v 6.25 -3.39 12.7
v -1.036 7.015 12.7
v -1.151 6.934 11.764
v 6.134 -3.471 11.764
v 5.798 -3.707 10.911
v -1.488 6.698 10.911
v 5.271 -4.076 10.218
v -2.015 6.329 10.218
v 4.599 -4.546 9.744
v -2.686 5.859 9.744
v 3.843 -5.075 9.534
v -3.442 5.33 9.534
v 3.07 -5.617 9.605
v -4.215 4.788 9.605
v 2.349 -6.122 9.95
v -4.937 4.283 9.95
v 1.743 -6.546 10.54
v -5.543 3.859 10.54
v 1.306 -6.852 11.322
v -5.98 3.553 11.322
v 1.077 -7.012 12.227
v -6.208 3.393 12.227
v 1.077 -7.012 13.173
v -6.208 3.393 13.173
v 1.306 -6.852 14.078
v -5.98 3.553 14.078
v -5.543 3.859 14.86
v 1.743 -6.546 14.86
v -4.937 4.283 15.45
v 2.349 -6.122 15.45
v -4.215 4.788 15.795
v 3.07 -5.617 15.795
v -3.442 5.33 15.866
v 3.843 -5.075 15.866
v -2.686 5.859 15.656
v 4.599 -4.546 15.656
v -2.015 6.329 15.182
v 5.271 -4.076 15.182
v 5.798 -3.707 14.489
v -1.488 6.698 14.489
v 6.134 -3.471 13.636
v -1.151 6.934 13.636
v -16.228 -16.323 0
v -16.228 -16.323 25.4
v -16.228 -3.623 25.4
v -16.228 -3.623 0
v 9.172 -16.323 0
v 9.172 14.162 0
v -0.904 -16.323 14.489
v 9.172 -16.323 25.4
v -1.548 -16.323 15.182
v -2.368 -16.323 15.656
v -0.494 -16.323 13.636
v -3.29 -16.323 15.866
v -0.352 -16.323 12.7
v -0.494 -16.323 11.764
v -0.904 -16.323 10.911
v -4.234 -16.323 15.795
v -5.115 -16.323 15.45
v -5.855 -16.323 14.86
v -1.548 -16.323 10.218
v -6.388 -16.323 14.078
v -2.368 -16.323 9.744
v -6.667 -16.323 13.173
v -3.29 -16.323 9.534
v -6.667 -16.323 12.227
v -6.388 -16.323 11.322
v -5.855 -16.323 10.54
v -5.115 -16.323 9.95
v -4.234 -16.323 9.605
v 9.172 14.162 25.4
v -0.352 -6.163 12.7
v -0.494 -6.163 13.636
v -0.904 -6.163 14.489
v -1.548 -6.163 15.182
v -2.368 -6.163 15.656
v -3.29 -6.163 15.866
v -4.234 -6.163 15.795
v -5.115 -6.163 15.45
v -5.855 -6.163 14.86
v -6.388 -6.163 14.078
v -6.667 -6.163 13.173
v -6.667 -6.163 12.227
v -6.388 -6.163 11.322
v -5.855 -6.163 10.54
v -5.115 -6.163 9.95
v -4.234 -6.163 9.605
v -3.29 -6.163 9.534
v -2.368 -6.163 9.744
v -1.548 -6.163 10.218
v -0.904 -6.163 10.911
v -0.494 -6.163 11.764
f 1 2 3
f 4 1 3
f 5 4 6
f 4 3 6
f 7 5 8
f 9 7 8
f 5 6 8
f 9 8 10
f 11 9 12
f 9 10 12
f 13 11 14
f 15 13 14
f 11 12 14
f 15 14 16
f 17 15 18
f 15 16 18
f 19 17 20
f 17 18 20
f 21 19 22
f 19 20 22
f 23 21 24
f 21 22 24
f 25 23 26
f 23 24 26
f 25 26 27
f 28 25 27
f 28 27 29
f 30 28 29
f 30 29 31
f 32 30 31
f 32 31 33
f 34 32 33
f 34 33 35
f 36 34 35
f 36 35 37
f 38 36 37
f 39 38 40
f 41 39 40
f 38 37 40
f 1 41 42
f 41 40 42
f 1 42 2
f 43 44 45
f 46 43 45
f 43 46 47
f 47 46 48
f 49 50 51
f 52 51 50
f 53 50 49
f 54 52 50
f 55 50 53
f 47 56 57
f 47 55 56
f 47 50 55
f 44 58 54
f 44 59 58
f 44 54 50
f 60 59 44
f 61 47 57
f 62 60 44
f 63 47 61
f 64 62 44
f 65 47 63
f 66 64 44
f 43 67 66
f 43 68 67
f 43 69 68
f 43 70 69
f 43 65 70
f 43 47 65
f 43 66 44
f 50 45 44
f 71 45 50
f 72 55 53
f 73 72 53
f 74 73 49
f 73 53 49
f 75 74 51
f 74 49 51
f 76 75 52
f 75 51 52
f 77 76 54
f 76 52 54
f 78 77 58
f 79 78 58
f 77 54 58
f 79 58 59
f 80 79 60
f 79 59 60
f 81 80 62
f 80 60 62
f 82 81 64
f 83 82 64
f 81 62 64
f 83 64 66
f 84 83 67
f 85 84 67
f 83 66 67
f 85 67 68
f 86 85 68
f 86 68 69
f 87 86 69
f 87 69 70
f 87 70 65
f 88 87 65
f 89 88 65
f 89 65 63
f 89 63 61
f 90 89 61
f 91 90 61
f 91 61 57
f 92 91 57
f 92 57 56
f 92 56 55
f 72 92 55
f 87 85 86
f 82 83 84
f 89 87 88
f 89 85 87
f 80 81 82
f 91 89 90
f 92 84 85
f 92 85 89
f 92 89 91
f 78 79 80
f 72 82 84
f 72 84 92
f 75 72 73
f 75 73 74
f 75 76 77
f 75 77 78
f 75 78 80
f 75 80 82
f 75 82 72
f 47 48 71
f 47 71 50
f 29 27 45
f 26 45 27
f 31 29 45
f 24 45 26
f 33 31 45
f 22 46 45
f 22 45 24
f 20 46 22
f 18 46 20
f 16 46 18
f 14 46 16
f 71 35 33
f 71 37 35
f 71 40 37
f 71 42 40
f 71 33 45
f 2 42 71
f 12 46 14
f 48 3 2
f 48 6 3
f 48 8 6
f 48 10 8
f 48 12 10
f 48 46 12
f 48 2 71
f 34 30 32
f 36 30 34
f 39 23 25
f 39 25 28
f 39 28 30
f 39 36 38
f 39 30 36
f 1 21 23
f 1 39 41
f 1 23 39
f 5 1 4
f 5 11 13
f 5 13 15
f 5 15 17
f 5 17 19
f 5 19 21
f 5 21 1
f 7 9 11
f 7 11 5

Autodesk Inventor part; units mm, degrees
ref_plane "YZ Plane" through (0, 0, 0) normal (1, 0, 0) x (0, 1, 0)
ref_plane "XZ Plane" through (0, 0, 0) normal (0, 1, 0) x (-1, 0, 0)
ref_plane "XY Plane" through (0, 0, 0) normal (0, 0, 1) x (1, 0, 0)
sketch "Sketch1" plane through (0, 0, 0) normal (0, 0, 1) x (1, 0, 0)
  line L0 (-16.2275, -3.6228) -> (9.1725, 14.1625)
  line L1 (9.1725, 14.1625) -> (9.1725, -16.3228)
  line L2 (9.1725, -16.3228) -> (-16.2275, -16.3228)
  line L3 (-16.2275, -16.3228) -> (-16.2275, -3.6228)
  dimension "d6" = 35
  dimension "d7" = 12.7
  dimension "d8" = 25.4
extrude "Extrusion1" add sketch "Sketch1" along normal blind 25.4
sketch "Sketch2" plane through (9.1725, 14.1625, 25.4) normal (-0.5736, 0.8192, 0) x (0.8192, 0.5736, 0)
  circle A0 centre (-15.6369, 12.7) radius 3.175
  point P0 (-15.6369, 25.4)
  dimension "d11" = 6.35
extrude "Extrusion2" cut sketch "Sketch2" against normal blind 12.7
sketch "Sketch3" plane through (-16.2275, -16.3228, 0) normal (0, -1, 0) x (1, 0, 0)
  circle A0 centre (12.7, 12.7) radius 3.175
  point P0 (16.2275, 0)
  dimension "d14" = 6.35
extrude "Extrusion3" cut sketch "Sketch3" against normal blind 10.16
properties part number "hack 35 degree mounting points"
